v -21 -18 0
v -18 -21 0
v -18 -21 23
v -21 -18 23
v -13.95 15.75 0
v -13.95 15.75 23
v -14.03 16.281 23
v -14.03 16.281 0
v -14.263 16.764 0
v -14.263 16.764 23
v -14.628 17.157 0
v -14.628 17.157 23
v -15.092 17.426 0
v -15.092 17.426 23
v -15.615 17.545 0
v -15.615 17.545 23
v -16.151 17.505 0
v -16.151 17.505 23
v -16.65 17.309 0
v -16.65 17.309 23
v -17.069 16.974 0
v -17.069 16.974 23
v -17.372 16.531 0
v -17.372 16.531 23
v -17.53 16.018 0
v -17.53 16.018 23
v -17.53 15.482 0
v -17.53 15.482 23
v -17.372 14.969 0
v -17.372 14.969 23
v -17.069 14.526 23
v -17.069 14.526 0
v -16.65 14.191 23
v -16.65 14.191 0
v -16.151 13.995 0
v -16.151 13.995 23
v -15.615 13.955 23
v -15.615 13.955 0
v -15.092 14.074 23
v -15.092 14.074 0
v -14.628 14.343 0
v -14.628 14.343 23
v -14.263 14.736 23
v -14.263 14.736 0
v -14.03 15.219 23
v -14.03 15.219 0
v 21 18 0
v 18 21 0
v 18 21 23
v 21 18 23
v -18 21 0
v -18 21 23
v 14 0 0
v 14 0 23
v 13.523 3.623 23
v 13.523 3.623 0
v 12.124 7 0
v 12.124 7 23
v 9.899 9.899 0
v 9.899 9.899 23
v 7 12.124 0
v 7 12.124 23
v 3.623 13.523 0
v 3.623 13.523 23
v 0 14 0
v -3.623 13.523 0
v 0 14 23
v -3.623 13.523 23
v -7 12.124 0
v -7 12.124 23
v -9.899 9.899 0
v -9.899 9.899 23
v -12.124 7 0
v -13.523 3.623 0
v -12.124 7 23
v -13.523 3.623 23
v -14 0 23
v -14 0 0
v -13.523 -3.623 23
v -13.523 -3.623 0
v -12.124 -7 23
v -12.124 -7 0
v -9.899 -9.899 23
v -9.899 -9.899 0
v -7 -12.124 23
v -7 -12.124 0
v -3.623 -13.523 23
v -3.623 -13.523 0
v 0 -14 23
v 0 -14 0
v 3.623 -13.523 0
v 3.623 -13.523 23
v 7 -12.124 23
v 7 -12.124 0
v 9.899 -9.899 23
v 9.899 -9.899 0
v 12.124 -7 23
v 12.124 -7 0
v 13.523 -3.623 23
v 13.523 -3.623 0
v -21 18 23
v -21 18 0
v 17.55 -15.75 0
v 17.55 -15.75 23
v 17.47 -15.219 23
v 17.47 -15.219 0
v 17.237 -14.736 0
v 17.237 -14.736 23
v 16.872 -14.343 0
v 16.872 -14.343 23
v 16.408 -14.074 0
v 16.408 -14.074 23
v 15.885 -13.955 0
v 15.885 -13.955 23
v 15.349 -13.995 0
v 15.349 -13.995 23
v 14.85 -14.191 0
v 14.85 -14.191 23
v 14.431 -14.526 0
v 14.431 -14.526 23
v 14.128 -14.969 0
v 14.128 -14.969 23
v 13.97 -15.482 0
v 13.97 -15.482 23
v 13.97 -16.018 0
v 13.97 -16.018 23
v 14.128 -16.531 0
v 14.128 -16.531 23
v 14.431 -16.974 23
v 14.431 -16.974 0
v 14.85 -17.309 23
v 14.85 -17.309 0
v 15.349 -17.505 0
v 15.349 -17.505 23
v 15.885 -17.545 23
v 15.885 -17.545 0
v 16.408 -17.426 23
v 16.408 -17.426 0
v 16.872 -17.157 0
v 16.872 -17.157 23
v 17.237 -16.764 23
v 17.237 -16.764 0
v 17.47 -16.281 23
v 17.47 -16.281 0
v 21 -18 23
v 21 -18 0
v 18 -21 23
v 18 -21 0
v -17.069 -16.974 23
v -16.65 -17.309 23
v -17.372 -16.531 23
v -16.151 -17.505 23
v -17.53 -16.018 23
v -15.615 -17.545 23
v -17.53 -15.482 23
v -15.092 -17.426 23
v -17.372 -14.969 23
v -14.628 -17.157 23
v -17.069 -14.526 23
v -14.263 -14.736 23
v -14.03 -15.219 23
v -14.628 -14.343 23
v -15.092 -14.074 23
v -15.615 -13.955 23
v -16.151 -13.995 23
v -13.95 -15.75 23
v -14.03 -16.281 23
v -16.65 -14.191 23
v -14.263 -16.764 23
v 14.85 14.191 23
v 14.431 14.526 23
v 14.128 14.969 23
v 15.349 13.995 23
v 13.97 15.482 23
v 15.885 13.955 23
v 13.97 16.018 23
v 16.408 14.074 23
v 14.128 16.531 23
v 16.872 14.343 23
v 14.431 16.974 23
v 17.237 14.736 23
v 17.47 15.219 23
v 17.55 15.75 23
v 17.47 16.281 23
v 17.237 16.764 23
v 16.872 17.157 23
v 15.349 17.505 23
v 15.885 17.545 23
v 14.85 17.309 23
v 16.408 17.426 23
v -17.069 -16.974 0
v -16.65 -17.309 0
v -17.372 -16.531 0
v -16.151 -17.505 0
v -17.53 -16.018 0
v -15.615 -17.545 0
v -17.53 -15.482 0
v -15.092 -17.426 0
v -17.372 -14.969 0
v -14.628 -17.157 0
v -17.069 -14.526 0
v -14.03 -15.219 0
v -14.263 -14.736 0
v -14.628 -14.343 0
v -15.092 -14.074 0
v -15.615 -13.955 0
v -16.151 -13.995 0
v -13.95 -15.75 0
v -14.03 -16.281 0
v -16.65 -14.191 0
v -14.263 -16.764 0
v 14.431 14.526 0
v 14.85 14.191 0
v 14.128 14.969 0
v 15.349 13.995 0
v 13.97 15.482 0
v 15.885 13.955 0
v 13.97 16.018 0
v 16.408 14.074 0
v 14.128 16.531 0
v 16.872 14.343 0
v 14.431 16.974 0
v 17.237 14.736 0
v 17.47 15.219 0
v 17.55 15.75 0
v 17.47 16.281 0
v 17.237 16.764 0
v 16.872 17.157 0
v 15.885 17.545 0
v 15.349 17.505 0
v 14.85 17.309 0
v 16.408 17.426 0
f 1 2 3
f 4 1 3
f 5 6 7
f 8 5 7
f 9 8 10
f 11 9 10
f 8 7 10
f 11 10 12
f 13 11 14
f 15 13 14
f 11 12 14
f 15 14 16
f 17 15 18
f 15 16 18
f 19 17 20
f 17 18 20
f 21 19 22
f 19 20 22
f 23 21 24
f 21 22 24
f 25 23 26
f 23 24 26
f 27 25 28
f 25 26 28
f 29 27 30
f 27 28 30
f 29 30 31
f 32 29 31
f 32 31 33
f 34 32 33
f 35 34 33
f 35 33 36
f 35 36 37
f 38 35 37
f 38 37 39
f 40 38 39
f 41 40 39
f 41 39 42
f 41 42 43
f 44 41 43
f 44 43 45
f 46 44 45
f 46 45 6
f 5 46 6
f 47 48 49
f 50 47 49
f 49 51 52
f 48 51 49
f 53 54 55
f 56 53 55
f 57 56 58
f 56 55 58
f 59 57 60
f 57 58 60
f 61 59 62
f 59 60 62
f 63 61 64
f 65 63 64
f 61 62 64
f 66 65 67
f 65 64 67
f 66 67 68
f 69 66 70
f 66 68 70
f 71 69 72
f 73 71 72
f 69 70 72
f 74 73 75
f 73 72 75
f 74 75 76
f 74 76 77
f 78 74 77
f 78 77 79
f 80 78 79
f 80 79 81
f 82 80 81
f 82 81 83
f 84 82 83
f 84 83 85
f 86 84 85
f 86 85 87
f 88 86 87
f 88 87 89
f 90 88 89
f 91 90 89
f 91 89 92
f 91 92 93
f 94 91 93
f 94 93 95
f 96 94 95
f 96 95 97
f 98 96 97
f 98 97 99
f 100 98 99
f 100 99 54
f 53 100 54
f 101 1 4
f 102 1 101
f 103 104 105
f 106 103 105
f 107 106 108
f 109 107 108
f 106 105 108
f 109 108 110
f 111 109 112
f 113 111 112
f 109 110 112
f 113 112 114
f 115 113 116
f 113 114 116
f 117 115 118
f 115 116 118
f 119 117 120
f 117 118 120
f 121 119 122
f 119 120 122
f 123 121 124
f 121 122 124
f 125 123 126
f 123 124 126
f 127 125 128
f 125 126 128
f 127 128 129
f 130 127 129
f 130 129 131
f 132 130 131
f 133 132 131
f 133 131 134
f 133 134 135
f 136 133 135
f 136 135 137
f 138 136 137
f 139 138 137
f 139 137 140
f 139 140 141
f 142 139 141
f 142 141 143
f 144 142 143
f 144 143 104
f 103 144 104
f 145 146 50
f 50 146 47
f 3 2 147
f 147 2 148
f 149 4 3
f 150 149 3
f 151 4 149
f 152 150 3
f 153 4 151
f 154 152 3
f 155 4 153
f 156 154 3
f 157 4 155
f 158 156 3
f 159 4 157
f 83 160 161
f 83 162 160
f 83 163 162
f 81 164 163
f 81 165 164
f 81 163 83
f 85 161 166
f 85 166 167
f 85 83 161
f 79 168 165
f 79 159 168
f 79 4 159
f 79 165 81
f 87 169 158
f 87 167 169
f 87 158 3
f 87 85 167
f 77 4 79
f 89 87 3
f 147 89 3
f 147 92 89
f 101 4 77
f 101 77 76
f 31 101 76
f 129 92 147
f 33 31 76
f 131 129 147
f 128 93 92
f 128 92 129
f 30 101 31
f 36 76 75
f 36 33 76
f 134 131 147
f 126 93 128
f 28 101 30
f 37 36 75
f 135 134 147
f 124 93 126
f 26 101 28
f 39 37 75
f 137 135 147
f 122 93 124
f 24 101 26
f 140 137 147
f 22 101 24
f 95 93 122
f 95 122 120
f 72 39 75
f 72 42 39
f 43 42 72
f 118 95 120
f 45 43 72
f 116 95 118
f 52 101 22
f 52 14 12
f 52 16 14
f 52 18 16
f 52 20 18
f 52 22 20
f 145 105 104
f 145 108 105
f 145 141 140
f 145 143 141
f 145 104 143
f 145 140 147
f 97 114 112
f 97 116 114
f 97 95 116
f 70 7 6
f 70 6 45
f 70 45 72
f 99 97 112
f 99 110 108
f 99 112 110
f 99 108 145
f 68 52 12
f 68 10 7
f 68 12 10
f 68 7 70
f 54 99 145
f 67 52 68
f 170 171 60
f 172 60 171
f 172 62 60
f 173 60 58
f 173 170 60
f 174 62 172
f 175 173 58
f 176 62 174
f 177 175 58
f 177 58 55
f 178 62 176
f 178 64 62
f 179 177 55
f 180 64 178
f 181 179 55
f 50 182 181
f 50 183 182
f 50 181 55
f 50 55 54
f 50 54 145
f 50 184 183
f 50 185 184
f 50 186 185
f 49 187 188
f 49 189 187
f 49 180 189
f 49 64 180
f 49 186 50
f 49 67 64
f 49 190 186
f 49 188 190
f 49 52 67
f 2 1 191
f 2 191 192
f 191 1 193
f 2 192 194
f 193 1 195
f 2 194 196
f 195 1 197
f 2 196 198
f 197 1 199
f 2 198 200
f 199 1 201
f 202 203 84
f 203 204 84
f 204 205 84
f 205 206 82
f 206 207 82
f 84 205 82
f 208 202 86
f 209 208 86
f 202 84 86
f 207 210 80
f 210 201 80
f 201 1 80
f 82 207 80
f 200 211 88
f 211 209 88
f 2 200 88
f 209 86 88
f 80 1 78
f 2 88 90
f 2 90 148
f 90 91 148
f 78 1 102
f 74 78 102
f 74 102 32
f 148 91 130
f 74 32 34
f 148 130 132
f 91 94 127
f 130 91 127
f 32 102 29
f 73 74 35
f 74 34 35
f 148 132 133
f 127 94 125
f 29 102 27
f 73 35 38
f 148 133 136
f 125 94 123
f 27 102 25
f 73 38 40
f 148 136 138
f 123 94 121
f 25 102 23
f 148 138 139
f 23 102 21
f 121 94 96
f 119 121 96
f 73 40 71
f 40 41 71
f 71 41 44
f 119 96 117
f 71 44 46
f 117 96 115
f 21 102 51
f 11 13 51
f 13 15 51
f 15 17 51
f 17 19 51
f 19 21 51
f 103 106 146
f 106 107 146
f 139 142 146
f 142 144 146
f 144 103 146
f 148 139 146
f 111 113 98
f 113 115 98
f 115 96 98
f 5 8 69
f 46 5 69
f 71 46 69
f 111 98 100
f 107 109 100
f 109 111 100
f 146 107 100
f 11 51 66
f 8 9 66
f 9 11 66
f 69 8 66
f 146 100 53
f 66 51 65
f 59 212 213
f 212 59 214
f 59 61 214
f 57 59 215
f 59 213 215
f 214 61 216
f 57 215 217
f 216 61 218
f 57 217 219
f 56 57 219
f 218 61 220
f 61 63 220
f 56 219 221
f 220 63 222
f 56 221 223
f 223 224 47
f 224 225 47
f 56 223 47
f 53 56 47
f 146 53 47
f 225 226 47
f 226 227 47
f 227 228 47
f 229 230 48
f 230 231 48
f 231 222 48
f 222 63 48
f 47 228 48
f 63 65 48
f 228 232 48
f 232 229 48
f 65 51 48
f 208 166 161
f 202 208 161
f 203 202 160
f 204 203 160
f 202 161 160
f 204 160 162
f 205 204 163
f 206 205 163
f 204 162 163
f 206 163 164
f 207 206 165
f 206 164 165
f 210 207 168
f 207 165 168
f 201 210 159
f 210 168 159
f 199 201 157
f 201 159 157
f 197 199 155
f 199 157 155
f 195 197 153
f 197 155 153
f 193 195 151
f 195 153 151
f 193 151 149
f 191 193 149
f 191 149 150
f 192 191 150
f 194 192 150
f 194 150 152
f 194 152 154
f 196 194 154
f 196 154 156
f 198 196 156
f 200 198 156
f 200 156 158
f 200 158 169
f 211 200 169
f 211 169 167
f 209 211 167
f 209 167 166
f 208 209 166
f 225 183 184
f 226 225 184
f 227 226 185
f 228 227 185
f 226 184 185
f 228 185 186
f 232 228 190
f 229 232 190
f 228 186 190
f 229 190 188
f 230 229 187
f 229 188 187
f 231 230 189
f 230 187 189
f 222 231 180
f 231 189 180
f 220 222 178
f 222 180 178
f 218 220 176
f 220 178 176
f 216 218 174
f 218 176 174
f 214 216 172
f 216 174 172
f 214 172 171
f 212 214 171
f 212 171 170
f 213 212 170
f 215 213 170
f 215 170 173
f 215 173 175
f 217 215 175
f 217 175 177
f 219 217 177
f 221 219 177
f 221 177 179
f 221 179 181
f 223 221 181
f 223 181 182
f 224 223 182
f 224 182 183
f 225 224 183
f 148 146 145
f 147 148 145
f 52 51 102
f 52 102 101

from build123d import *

# Parameters (mm, degrees)
SKETCH1_W           = 42
SKETCH1_H           = 42
BOSS_EXTRUDE1_DEPTH = 23
CHAMFER1_SIZE       = 3
CUT_EXTRUDE_2_REACH = 25
SKETCH4_R           = 1.8
CUT_EXTRUDE_3_REACH = 25
SKETCH2_R           = 14


with BuildPart() as part:
    # Sketch1 → Boss-Extrude1 (new body)
    with BuildSketch(Plane.XY):
        Rectangle(SKETCH1_W, SKETCH1_H)
    extrude(amount=BOSS_EXTRUDE1_DEPTH)

    # Chamfer1
    chamfer1_edges = [part.edges().sort_by_distance(p)[0] for p in [
        (21, -21, 11.5),
        (-21, -21, 11.5),
        (-21, 21, 11.5),
        (21, 21, 11.5),
    ]]
    chamfer(chamfer1_edges, length=CHAMFER1_SIZE)

    # Sketch4 → Вырез-Вытянуть2 (cut, up to next)
    with BuildSketch(Plane.XY.offset(23), mode=Mode.PRIVATE) as cut_extrude_2_sk1:
        with Locations((-15.75, 15.75)):
            Circle(SKETCH4_R)
    cut_extrude_2_tool1 = extrude(cut_extrude_2_sk1.sketch, amount=-CUT_EXTRUDE_2_REACH, mode=Mode.PRIVATE) & part.part
    add(cut_extrude_2_tool1.solids().sort_by_distance((-15.75, 15.75, 23))[0], mode=Mode.SUBTRACT)
    # Sketch4 → Вырез-Вытянуть2 (cut, up to next)
    with BuildSketch(Plane.XY.offset(23), mode=Mode.PRIVATE) as cut_extrude_2_sk2:
        with Locations((15.75, 15.75)):
            Circle(SKETCH4_R)
    cut_extrude_2_tool2 = extrude(cut_extrude_2_sk2.sketch, amount=-CUT_EXTRUDE_2_REACH, mode=Mode.PRIVATE) & part.part
    add(cut_extrude_2_tool2.solids().sort_by_distance((15.75, 15.75, 23))[0], mode=Mode.SUBTRACT)
    # Sketch4 → Вырез-Вытянуть2 (cut, up to next)
    with BuildSketch(Plane.XY.offset(23), mode=Mode.PRIVATE) as cut_extrude_2_sk3:
        with Locations((-15.75, -15.75)):
            Circle(SKETCH4_R)
    cut_extrude_2_tool3 = extrude(cut_extrude_2_sk3.sketch, amount=-CUT_EXTRUDE_2_REACH, mode=Mode.PRIVATE) & part.part
    add(cut_extrude_2_tool3.solids().sort_by_distance((-15.75, -15.75, 23))[0], mode=Mode.SUBTRACT)
    # Sketch4 → Вырез-Вытянуть2 (cut, up to next)
    with BuildSketch(Plane.XY.offset(23), mode=Mode.PRIVATE) as cut_extrude_2_sk4:
        with Locations((15.75, -15.75)):
            Circle(SKETCH4_R)
    cut_extrude_2_tool4 = extrude(cut_extrude_2_sk4.sketch, amount=-CUT_EXTRUDE_2_REACH, mode=Mode.PRIVATE) & part.part
    add(cut_extrude_2_tool4.solids().sort_by_distance((15.75, -15.75, 23))[0], mode=Mode.SUBTRACT)

    # Sketch2 → Вырез-Вытянуть3 (cut, up to next)
    with BuildSketch(Plane.XY.offset(23), mode=Mode.PRIVATE) as cut_extrude_3_sk1:
        Circle(SKETCH2_R)
    cut_extrude_3_tool1 = extrude(cut_extrude_3_sk1.sketch, amount=-CUT_EXTRUDE_3_REACH, mode=Mode.PRIVATE) & part.part
    add(cut_extrude_3_tool1.solids().sort_by_distance((0, 0, 23))[0], mode=Mode.SUBTRACT)


solid = part.part
